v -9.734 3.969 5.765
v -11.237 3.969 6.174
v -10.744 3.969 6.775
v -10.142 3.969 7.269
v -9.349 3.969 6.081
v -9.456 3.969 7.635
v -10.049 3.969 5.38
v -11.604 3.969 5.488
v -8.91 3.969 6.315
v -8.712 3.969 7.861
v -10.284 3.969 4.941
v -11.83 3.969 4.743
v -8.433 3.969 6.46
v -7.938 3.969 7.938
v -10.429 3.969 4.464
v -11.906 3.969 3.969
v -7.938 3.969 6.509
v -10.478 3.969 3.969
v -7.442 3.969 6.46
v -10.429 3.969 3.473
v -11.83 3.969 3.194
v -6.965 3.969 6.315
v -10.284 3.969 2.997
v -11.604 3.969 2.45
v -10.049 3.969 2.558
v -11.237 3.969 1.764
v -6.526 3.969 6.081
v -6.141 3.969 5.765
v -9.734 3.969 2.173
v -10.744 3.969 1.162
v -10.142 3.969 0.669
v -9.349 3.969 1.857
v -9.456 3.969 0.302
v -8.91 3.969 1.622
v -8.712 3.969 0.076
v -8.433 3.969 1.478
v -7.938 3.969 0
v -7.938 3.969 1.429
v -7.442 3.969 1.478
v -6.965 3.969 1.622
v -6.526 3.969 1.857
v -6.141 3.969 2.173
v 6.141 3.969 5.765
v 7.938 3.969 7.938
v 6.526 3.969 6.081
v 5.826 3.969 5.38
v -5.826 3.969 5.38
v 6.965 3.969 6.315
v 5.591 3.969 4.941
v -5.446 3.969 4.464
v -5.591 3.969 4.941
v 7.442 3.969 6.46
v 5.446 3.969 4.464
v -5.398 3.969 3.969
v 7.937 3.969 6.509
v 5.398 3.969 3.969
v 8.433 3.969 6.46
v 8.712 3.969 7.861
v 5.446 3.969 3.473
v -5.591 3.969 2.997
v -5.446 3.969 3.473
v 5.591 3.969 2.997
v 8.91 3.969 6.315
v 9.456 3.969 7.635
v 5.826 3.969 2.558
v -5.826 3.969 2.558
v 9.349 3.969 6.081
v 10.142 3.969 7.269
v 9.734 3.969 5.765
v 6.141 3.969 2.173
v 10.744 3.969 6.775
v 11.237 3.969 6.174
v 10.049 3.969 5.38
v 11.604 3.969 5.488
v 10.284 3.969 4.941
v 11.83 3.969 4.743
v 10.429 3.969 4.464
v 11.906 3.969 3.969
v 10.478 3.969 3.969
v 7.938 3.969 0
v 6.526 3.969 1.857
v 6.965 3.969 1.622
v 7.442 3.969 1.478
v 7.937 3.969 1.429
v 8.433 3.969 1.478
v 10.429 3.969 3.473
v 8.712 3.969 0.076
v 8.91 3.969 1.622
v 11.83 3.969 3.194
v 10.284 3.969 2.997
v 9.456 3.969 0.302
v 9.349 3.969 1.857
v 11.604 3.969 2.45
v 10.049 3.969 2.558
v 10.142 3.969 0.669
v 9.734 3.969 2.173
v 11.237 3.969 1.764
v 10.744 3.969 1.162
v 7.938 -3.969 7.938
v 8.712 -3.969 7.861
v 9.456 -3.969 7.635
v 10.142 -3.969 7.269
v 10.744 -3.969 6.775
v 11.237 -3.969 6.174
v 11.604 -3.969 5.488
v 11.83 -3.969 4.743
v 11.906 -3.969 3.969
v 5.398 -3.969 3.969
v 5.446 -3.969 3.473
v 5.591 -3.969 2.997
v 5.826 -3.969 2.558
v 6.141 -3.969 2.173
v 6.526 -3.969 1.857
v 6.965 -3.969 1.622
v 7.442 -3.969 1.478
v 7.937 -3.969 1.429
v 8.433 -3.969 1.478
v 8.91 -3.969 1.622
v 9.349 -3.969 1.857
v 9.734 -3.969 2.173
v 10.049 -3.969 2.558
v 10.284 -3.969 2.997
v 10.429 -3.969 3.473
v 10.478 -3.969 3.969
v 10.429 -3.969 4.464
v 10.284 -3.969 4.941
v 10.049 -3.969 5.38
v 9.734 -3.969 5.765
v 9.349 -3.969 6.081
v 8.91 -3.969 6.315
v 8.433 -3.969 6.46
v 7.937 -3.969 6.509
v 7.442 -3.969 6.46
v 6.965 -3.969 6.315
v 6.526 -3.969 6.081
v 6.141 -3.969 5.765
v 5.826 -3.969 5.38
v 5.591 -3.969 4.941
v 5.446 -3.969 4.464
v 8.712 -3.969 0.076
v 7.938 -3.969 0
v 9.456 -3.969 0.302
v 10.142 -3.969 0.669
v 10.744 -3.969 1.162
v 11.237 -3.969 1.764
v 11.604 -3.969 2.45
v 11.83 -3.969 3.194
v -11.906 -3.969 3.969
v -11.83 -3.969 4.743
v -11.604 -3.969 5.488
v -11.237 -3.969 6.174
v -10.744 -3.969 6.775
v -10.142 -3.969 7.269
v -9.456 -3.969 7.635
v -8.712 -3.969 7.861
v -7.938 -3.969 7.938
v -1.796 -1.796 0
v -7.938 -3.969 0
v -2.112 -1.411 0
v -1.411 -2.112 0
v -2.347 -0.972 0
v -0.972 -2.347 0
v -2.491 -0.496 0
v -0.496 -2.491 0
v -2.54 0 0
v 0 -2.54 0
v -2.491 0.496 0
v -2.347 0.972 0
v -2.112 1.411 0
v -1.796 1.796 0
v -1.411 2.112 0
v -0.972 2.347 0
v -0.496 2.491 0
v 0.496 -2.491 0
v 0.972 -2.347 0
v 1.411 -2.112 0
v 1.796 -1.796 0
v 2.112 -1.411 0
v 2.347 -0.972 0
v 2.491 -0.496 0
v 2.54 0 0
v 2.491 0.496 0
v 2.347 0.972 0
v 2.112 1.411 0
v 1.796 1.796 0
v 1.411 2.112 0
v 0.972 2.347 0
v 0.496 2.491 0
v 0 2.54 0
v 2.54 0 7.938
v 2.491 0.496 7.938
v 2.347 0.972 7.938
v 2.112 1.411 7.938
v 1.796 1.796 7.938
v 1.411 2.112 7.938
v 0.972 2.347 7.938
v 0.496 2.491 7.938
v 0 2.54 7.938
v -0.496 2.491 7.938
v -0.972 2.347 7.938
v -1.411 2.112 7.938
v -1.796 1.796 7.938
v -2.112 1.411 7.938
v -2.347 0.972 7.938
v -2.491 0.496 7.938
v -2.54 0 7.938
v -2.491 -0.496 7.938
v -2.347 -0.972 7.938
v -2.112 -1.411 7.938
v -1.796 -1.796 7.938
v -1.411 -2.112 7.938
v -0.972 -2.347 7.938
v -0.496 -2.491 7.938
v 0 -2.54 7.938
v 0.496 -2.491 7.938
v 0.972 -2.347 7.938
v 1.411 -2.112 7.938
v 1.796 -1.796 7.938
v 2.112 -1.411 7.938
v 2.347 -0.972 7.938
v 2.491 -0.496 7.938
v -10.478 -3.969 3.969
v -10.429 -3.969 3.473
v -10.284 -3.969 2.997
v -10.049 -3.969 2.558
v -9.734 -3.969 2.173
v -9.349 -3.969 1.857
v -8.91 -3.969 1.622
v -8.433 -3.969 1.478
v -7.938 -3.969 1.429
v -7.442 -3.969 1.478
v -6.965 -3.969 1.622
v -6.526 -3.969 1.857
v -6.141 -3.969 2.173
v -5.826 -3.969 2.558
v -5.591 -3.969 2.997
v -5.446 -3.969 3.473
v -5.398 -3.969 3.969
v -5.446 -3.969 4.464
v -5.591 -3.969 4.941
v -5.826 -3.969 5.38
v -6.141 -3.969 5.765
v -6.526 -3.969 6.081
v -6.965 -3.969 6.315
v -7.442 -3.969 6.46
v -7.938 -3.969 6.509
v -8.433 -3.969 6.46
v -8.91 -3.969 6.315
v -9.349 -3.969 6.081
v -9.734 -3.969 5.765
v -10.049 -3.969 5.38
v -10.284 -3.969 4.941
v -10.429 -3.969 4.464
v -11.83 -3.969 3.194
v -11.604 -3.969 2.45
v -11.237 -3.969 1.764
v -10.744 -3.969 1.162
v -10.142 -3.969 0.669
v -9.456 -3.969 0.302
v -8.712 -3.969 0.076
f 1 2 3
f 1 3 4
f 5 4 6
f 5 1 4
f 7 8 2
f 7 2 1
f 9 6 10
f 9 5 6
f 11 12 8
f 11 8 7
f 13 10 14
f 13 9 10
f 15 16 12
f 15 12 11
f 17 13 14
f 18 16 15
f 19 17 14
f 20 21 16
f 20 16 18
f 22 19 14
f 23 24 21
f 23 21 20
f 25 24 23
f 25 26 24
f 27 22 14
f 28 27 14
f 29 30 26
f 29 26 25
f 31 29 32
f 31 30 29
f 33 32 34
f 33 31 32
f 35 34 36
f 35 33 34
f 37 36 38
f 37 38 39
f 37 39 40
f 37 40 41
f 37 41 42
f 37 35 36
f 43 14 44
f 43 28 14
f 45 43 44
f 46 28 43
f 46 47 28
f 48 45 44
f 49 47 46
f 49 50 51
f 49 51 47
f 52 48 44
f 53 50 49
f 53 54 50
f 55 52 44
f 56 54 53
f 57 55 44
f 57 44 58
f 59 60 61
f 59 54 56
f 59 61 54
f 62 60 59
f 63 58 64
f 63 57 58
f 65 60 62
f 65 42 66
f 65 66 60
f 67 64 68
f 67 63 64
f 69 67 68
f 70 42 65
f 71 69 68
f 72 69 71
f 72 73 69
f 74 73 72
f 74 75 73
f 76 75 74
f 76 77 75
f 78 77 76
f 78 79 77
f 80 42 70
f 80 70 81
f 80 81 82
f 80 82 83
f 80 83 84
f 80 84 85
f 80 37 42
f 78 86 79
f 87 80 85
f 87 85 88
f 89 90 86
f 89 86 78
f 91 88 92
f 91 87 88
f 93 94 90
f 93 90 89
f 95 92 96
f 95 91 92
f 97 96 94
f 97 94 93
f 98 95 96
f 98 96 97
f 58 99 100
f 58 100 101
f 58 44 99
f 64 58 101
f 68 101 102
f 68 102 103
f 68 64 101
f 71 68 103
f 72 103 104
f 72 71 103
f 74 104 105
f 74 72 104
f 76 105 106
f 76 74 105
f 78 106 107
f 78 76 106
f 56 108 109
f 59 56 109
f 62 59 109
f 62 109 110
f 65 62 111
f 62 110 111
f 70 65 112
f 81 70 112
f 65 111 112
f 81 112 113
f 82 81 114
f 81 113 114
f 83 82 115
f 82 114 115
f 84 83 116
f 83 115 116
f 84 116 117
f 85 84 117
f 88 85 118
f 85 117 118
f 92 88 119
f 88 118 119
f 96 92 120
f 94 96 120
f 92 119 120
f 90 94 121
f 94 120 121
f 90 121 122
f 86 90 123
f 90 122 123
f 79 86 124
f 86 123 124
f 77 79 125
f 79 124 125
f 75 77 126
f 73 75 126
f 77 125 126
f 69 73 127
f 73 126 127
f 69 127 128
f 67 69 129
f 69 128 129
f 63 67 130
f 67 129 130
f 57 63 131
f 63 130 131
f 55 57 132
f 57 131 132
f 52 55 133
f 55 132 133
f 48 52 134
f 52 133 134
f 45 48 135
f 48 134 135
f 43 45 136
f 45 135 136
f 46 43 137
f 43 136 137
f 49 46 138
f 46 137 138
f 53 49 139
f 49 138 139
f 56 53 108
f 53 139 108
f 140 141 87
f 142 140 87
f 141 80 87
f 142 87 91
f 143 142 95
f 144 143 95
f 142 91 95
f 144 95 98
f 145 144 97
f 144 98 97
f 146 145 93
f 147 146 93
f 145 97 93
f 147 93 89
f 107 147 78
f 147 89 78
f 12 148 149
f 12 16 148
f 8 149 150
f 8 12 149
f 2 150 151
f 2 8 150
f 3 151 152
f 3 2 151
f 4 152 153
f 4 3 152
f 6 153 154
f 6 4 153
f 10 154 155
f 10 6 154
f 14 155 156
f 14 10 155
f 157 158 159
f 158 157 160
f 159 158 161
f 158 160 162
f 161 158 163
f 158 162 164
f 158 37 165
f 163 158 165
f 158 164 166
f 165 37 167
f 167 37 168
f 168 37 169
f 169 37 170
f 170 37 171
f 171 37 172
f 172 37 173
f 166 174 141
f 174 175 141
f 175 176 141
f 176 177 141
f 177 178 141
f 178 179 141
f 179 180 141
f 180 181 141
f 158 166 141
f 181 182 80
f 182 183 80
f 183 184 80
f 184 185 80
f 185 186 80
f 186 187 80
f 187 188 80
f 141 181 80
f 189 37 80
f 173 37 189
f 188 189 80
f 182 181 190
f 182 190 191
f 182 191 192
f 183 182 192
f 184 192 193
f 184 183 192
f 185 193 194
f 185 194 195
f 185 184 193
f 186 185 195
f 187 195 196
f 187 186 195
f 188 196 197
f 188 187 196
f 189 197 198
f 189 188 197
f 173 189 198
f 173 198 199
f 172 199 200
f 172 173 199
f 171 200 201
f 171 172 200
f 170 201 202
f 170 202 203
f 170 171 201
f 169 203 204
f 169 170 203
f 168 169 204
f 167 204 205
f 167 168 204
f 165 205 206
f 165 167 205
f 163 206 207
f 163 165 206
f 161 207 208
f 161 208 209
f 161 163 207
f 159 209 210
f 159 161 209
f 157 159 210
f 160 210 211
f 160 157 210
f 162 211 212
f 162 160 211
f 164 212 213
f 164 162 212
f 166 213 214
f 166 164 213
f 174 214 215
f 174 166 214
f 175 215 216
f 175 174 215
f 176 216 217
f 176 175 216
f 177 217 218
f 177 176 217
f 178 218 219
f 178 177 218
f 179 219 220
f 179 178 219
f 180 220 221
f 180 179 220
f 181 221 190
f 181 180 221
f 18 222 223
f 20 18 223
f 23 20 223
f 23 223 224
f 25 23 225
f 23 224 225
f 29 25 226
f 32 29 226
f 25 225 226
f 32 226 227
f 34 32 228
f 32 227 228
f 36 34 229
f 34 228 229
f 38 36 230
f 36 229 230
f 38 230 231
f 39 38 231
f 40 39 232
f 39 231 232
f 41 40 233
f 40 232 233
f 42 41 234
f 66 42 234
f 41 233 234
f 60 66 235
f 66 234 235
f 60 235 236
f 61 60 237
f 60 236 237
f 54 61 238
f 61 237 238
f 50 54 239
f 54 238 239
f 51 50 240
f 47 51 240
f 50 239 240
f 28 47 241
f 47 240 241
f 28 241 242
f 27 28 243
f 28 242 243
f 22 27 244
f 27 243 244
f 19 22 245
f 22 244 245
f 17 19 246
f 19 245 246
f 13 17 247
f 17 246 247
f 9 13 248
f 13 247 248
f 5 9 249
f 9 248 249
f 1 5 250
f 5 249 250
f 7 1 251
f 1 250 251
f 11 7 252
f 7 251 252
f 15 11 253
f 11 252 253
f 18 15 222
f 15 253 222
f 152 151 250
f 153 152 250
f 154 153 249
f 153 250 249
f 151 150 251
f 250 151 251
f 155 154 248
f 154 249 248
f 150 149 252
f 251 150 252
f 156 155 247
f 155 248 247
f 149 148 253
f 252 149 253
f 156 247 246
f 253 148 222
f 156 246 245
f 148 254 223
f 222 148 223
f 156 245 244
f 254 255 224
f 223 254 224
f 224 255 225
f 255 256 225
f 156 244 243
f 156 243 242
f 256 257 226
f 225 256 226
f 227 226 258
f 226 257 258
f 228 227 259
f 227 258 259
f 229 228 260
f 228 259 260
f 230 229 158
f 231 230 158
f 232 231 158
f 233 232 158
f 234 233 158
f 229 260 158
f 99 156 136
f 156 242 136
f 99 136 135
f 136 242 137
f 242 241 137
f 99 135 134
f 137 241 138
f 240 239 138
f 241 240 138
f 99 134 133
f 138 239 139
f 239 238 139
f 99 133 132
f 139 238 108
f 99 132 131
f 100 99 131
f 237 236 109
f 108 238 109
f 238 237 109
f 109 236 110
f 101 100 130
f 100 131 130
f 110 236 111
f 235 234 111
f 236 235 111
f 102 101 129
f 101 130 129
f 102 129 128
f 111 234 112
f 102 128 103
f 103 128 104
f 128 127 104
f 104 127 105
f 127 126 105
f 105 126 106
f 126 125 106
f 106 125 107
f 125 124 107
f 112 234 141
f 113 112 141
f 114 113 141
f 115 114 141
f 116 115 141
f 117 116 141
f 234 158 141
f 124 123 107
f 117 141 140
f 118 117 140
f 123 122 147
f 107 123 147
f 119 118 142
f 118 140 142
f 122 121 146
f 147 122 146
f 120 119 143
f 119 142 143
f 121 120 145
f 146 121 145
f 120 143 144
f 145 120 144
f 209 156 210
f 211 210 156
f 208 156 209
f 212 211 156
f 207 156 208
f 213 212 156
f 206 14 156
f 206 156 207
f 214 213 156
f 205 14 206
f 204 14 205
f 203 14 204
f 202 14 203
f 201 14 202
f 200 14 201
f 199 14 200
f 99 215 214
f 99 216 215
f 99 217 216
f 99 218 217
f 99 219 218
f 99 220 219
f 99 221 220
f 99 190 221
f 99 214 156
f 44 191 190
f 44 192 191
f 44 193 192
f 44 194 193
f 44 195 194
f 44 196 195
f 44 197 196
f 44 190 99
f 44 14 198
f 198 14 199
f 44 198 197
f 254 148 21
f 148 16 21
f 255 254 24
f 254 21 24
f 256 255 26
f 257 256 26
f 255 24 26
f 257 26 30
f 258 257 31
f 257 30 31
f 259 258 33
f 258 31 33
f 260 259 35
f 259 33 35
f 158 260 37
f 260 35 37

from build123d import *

# Parameters (mm, degrees)
F0_W     = 23.8125
F0_H     = 7.9375
F0_R     = 2.54
F1_DEPTH = 7.9375
F3_DEPTH = 7.9375
F4_R     = 3.96874


# Not quite as in the source:
# - a fillet or chamfer is up to 0.001 mm smaller than in the source, because OpenCascade refuses the exact size


with BuildPart() as f1:
    # F0 (on Top) → F1 (new body)
    with BuildSketch(Plane.XY):
        Rectangle(F0_W, F0_H)
        Circle(F0_R, mode=Mode.SUBTRACT)
    extrude(amount=F1_DEPTH)

    # F2 (on face) → F3 (cut, through all)
    with BuildSketch(Plane.XZ.offset(3.96875)):
        with BuildLine():
            ThreePointArc((-5.3975, 3.96875), (-7.9375, 6.50875), (-10.4775, 3.96875))
            Line((-10.4775, 3.96875), (-7.9375, 3.96875))
            Line((-7.9375, 3.96875), (-5.3975, 3.96875))
        make_face()
        with BuildLine():
            ThreePointArc((10.4775, 3.96875), (7.9375, 6.50875), (5.3975, 3.96875))
            Line((5.3975, 3.96875), (7.9375, 3.96875))
            Line((7.9375, 3.96875), (10.4775, 3.96875))
        make_face()
        with BuildLine():
            Line((7.9375, 3.96875), (5.3975, 3.96875))
            ThreePointArc((5.3975, 3.96875), (7.9375, 1.42875), (10.4775, 3.96875))
            Line((10.4775, 3.96875), (7.9375, 3.96875))
        make_face()
        with BuildLine():
            Line((-7.9375, 3.96875), (-10.4775, 3.96875))
            ThreePointArc((-10.4775, 3.96875), (-7.9375, 1.42875), (-5.3975, 3.96875))
            Line((-5.3975, 3.96875), (-7.9375, 3.96875))
        make_face()
    extrude(amount=-F3_DEPTH, mode=Mode.SUBTRACT)

    # F4 (radius 3.96875 in the source; OpenCascade refuses exactly that, so slightly less here)
    f4_edges = [f1.edges().sort_by_distance(p)[0] for p in [
        (11.90625, 0, 7.9375),
        (11.90625, 0, 0),
        (-11.90625, 0, 7.9375),
        (-11.90625, 0, 0),
    ]]
    fillet(f4_edges, radius=F4_R)


solid = f1.part
